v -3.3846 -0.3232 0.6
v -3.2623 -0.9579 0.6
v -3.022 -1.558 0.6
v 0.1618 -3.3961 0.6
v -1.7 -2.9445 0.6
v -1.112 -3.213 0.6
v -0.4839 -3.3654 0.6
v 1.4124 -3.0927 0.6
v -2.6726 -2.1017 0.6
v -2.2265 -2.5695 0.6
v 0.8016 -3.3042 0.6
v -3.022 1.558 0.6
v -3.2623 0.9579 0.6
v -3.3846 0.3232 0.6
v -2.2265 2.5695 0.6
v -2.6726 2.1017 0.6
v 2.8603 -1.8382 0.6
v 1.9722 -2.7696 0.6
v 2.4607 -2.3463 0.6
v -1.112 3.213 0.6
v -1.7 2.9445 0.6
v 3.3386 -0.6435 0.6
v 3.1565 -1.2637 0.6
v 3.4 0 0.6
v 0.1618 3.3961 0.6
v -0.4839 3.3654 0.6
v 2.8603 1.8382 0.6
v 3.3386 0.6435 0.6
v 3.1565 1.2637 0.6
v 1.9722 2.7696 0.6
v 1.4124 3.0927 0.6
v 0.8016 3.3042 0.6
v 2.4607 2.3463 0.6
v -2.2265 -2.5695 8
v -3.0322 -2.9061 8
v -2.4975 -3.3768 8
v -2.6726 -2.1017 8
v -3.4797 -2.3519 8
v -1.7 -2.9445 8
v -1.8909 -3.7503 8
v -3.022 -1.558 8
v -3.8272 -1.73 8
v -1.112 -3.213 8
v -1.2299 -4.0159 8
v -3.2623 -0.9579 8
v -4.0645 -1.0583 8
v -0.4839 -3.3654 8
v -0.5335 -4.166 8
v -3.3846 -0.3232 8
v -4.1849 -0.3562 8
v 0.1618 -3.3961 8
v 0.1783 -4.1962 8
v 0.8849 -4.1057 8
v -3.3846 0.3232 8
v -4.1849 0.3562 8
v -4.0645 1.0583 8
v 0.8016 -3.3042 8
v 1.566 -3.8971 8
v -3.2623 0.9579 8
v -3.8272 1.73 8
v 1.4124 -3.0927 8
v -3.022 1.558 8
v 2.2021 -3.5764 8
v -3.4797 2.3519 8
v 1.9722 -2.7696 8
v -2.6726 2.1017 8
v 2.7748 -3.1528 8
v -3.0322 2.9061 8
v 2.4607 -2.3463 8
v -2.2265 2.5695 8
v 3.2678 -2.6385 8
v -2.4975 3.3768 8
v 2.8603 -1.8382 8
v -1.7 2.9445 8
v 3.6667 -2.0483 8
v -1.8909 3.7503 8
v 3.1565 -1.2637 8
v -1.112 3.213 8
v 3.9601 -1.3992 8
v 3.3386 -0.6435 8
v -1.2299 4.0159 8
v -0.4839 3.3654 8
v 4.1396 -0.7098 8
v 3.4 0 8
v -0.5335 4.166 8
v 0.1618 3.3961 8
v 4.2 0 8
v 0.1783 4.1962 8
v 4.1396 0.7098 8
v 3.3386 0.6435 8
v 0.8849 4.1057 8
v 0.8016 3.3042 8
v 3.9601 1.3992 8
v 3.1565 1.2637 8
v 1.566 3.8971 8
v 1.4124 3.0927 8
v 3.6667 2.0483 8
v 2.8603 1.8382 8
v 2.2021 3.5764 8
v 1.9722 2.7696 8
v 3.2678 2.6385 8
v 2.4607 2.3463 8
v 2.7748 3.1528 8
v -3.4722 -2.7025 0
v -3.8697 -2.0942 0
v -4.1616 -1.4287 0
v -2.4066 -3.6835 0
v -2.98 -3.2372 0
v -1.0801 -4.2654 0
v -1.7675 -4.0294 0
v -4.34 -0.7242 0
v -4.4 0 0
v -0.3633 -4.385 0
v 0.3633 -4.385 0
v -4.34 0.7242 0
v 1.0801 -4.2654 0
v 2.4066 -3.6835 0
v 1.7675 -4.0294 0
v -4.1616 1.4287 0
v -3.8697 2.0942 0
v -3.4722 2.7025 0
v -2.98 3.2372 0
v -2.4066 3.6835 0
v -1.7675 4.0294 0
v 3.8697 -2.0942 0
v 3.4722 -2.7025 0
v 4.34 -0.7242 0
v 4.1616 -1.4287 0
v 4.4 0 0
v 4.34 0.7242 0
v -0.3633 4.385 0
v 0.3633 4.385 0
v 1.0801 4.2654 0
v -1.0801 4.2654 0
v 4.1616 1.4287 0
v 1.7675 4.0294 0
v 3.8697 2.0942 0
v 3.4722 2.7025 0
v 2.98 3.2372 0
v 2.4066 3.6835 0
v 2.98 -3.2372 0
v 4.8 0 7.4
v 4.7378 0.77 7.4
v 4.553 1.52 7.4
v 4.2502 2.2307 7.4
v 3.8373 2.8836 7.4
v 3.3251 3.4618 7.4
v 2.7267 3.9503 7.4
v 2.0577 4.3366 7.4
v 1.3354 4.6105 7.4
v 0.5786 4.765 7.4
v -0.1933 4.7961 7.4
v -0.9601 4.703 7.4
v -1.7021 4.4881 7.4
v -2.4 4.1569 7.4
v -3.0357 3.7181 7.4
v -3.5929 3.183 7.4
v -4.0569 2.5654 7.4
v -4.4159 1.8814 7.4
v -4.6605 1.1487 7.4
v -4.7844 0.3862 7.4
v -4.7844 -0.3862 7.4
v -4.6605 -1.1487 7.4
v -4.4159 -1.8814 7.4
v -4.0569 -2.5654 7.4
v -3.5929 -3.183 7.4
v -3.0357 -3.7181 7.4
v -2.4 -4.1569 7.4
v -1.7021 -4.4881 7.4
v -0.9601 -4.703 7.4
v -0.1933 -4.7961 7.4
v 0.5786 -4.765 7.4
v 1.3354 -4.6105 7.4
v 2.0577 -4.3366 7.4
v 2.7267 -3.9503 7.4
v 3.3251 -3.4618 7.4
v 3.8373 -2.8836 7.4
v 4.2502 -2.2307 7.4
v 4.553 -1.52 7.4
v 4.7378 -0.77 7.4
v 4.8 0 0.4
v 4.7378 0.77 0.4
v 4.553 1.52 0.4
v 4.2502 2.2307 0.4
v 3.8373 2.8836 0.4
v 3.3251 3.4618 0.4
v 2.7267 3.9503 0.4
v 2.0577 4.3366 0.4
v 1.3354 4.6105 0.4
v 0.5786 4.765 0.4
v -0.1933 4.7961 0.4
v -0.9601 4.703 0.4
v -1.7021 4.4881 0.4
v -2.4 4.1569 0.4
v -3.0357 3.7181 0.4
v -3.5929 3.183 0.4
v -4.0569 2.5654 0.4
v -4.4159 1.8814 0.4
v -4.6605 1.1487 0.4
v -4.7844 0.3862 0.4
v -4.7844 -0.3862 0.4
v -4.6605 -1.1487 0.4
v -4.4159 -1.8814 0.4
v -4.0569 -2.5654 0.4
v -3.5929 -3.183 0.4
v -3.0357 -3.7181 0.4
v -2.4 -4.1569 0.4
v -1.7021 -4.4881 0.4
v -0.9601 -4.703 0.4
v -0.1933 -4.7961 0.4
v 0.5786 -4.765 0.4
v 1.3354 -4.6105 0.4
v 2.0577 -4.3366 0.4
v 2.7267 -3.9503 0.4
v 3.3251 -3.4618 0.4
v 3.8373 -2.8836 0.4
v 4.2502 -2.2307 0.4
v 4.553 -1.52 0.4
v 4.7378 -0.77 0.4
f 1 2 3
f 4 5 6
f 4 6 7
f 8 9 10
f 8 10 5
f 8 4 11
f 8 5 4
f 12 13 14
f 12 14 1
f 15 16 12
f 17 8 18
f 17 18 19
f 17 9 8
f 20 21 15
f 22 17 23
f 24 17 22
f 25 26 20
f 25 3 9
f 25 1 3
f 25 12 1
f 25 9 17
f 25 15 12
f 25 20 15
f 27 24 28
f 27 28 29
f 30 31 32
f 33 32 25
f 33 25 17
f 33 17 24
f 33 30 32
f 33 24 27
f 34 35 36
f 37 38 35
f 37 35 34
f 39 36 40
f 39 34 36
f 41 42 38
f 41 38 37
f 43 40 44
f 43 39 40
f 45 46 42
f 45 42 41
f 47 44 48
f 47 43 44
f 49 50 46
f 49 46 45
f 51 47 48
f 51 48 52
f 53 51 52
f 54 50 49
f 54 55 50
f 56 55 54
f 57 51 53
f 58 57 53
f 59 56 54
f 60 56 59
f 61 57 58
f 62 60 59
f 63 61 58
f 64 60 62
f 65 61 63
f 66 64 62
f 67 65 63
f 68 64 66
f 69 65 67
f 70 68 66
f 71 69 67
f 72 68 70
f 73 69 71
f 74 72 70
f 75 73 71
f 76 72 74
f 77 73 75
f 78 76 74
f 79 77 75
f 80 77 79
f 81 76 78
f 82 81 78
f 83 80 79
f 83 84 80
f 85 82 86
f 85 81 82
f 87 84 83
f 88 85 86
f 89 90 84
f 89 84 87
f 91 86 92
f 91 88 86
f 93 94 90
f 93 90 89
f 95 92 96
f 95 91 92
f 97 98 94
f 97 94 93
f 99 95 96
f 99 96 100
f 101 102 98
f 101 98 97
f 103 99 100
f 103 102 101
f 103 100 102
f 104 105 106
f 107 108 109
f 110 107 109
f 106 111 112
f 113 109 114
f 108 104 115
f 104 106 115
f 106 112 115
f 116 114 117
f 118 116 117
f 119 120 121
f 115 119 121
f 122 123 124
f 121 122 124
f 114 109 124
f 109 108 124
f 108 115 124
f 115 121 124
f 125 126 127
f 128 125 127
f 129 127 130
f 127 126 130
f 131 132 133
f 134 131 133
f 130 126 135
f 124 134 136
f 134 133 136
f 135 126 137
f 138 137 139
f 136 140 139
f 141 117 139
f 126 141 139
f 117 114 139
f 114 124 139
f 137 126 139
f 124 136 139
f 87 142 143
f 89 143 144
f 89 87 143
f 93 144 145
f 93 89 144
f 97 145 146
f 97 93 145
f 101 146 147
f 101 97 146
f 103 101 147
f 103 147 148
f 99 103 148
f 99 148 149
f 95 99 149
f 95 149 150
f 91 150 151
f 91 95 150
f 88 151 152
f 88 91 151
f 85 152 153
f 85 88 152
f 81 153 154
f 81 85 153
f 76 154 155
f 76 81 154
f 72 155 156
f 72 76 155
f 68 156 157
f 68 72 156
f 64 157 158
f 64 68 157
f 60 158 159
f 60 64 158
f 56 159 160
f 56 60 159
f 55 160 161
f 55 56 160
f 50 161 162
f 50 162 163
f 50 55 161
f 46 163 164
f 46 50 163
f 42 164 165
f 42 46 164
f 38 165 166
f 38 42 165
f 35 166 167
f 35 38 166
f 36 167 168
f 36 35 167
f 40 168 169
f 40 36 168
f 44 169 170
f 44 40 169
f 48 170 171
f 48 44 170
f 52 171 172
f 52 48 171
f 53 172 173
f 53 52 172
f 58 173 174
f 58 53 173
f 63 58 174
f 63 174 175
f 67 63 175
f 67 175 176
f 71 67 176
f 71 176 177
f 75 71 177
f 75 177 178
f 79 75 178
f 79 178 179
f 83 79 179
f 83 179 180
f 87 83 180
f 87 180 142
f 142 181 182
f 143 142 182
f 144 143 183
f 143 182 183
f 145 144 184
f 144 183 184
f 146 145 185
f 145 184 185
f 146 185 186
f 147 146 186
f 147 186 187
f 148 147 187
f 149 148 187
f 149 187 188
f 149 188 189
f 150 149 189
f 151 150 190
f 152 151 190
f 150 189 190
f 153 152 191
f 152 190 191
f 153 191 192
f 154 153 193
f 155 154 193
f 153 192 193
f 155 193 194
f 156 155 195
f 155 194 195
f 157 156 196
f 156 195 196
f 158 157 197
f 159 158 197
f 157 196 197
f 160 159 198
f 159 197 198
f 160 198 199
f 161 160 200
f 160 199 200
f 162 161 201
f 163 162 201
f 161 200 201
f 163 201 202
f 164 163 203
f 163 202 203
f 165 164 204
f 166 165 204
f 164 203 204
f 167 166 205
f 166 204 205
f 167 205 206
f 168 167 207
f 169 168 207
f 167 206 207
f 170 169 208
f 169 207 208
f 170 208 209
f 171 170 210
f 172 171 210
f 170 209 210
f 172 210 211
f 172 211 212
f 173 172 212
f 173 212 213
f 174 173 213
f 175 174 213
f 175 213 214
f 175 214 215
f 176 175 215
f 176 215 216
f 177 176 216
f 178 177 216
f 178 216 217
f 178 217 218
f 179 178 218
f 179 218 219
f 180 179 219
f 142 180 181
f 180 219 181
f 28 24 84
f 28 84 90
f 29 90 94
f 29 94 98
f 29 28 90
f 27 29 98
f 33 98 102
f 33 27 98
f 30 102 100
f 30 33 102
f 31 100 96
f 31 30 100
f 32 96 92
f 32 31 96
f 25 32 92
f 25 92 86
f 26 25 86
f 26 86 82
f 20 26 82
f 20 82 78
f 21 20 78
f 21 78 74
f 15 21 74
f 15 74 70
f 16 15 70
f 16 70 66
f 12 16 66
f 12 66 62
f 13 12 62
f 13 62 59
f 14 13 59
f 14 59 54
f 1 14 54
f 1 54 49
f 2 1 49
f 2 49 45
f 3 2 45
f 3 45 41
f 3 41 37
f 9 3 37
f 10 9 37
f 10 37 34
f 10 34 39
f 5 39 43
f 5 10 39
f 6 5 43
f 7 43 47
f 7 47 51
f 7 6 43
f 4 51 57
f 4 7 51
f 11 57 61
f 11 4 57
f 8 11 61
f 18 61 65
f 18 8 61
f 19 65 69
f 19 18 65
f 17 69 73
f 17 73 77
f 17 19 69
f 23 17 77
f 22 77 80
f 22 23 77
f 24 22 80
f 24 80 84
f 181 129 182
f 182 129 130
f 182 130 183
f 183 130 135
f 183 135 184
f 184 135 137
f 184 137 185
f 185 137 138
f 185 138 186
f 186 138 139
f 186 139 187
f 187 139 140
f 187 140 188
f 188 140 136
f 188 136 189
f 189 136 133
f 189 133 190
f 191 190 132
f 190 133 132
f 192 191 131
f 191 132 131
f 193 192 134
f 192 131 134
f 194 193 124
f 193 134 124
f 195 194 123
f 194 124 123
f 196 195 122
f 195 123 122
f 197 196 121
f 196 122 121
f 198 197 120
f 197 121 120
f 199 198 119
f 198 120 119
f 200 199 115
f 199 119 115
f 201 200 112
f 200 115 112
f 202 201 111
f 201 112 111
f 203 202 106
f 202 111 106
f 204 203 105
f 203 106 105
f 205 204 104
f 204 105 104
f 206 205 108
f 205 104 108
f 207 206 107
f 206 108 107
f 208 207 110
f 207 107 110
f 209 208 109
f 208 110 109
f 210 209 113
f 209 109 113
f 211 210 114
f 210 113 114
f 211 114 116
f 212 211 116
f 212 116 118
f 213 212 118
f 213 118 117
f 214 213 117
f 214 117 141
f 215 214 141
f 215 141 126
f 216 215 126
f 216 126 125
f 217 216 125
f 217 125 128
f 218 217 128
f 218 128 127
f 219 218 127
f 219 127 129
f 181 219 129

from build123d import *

# Parameters (mm, degrees)
F0_R     = 3.4
F1_DEPTH = 0.6
F0_R_2   = 4.8
F2_DEPTH = 8
F3_SIZE  = 0.4
F4_SIZE  = 0.6


with BuildPart() as f1:
    # F0 (on Top) → F1 (new body)
    with BuildSketch(Plane.XY):
        Circle(F0_R)
    extrude(amount=F1_DEPTH)

    # F0 (on Top) → F2 (join)
    with BuildSketch(Plane.XY):
        Circle(F0_R_2)
        Circle(F0_R, mode=Mode.SUBTRACT)
    extrude(amount=F2_DEPTH)

    # F3
    f3_edges = [f1.edges().sort_by_distance(p)[0] for p in [
        (-4.8, 0, 0),
    ]]
    chamfer(f3_edges, length=F3_SIZE)

    # F4
    f4_edges = [f1.edges().sort_by_distance(p)[0] for p in [
        (-4.8, 0, 8),
    ]]
    chamfer(f4_edges, length=F4_SIZE)


solid = f1.part
